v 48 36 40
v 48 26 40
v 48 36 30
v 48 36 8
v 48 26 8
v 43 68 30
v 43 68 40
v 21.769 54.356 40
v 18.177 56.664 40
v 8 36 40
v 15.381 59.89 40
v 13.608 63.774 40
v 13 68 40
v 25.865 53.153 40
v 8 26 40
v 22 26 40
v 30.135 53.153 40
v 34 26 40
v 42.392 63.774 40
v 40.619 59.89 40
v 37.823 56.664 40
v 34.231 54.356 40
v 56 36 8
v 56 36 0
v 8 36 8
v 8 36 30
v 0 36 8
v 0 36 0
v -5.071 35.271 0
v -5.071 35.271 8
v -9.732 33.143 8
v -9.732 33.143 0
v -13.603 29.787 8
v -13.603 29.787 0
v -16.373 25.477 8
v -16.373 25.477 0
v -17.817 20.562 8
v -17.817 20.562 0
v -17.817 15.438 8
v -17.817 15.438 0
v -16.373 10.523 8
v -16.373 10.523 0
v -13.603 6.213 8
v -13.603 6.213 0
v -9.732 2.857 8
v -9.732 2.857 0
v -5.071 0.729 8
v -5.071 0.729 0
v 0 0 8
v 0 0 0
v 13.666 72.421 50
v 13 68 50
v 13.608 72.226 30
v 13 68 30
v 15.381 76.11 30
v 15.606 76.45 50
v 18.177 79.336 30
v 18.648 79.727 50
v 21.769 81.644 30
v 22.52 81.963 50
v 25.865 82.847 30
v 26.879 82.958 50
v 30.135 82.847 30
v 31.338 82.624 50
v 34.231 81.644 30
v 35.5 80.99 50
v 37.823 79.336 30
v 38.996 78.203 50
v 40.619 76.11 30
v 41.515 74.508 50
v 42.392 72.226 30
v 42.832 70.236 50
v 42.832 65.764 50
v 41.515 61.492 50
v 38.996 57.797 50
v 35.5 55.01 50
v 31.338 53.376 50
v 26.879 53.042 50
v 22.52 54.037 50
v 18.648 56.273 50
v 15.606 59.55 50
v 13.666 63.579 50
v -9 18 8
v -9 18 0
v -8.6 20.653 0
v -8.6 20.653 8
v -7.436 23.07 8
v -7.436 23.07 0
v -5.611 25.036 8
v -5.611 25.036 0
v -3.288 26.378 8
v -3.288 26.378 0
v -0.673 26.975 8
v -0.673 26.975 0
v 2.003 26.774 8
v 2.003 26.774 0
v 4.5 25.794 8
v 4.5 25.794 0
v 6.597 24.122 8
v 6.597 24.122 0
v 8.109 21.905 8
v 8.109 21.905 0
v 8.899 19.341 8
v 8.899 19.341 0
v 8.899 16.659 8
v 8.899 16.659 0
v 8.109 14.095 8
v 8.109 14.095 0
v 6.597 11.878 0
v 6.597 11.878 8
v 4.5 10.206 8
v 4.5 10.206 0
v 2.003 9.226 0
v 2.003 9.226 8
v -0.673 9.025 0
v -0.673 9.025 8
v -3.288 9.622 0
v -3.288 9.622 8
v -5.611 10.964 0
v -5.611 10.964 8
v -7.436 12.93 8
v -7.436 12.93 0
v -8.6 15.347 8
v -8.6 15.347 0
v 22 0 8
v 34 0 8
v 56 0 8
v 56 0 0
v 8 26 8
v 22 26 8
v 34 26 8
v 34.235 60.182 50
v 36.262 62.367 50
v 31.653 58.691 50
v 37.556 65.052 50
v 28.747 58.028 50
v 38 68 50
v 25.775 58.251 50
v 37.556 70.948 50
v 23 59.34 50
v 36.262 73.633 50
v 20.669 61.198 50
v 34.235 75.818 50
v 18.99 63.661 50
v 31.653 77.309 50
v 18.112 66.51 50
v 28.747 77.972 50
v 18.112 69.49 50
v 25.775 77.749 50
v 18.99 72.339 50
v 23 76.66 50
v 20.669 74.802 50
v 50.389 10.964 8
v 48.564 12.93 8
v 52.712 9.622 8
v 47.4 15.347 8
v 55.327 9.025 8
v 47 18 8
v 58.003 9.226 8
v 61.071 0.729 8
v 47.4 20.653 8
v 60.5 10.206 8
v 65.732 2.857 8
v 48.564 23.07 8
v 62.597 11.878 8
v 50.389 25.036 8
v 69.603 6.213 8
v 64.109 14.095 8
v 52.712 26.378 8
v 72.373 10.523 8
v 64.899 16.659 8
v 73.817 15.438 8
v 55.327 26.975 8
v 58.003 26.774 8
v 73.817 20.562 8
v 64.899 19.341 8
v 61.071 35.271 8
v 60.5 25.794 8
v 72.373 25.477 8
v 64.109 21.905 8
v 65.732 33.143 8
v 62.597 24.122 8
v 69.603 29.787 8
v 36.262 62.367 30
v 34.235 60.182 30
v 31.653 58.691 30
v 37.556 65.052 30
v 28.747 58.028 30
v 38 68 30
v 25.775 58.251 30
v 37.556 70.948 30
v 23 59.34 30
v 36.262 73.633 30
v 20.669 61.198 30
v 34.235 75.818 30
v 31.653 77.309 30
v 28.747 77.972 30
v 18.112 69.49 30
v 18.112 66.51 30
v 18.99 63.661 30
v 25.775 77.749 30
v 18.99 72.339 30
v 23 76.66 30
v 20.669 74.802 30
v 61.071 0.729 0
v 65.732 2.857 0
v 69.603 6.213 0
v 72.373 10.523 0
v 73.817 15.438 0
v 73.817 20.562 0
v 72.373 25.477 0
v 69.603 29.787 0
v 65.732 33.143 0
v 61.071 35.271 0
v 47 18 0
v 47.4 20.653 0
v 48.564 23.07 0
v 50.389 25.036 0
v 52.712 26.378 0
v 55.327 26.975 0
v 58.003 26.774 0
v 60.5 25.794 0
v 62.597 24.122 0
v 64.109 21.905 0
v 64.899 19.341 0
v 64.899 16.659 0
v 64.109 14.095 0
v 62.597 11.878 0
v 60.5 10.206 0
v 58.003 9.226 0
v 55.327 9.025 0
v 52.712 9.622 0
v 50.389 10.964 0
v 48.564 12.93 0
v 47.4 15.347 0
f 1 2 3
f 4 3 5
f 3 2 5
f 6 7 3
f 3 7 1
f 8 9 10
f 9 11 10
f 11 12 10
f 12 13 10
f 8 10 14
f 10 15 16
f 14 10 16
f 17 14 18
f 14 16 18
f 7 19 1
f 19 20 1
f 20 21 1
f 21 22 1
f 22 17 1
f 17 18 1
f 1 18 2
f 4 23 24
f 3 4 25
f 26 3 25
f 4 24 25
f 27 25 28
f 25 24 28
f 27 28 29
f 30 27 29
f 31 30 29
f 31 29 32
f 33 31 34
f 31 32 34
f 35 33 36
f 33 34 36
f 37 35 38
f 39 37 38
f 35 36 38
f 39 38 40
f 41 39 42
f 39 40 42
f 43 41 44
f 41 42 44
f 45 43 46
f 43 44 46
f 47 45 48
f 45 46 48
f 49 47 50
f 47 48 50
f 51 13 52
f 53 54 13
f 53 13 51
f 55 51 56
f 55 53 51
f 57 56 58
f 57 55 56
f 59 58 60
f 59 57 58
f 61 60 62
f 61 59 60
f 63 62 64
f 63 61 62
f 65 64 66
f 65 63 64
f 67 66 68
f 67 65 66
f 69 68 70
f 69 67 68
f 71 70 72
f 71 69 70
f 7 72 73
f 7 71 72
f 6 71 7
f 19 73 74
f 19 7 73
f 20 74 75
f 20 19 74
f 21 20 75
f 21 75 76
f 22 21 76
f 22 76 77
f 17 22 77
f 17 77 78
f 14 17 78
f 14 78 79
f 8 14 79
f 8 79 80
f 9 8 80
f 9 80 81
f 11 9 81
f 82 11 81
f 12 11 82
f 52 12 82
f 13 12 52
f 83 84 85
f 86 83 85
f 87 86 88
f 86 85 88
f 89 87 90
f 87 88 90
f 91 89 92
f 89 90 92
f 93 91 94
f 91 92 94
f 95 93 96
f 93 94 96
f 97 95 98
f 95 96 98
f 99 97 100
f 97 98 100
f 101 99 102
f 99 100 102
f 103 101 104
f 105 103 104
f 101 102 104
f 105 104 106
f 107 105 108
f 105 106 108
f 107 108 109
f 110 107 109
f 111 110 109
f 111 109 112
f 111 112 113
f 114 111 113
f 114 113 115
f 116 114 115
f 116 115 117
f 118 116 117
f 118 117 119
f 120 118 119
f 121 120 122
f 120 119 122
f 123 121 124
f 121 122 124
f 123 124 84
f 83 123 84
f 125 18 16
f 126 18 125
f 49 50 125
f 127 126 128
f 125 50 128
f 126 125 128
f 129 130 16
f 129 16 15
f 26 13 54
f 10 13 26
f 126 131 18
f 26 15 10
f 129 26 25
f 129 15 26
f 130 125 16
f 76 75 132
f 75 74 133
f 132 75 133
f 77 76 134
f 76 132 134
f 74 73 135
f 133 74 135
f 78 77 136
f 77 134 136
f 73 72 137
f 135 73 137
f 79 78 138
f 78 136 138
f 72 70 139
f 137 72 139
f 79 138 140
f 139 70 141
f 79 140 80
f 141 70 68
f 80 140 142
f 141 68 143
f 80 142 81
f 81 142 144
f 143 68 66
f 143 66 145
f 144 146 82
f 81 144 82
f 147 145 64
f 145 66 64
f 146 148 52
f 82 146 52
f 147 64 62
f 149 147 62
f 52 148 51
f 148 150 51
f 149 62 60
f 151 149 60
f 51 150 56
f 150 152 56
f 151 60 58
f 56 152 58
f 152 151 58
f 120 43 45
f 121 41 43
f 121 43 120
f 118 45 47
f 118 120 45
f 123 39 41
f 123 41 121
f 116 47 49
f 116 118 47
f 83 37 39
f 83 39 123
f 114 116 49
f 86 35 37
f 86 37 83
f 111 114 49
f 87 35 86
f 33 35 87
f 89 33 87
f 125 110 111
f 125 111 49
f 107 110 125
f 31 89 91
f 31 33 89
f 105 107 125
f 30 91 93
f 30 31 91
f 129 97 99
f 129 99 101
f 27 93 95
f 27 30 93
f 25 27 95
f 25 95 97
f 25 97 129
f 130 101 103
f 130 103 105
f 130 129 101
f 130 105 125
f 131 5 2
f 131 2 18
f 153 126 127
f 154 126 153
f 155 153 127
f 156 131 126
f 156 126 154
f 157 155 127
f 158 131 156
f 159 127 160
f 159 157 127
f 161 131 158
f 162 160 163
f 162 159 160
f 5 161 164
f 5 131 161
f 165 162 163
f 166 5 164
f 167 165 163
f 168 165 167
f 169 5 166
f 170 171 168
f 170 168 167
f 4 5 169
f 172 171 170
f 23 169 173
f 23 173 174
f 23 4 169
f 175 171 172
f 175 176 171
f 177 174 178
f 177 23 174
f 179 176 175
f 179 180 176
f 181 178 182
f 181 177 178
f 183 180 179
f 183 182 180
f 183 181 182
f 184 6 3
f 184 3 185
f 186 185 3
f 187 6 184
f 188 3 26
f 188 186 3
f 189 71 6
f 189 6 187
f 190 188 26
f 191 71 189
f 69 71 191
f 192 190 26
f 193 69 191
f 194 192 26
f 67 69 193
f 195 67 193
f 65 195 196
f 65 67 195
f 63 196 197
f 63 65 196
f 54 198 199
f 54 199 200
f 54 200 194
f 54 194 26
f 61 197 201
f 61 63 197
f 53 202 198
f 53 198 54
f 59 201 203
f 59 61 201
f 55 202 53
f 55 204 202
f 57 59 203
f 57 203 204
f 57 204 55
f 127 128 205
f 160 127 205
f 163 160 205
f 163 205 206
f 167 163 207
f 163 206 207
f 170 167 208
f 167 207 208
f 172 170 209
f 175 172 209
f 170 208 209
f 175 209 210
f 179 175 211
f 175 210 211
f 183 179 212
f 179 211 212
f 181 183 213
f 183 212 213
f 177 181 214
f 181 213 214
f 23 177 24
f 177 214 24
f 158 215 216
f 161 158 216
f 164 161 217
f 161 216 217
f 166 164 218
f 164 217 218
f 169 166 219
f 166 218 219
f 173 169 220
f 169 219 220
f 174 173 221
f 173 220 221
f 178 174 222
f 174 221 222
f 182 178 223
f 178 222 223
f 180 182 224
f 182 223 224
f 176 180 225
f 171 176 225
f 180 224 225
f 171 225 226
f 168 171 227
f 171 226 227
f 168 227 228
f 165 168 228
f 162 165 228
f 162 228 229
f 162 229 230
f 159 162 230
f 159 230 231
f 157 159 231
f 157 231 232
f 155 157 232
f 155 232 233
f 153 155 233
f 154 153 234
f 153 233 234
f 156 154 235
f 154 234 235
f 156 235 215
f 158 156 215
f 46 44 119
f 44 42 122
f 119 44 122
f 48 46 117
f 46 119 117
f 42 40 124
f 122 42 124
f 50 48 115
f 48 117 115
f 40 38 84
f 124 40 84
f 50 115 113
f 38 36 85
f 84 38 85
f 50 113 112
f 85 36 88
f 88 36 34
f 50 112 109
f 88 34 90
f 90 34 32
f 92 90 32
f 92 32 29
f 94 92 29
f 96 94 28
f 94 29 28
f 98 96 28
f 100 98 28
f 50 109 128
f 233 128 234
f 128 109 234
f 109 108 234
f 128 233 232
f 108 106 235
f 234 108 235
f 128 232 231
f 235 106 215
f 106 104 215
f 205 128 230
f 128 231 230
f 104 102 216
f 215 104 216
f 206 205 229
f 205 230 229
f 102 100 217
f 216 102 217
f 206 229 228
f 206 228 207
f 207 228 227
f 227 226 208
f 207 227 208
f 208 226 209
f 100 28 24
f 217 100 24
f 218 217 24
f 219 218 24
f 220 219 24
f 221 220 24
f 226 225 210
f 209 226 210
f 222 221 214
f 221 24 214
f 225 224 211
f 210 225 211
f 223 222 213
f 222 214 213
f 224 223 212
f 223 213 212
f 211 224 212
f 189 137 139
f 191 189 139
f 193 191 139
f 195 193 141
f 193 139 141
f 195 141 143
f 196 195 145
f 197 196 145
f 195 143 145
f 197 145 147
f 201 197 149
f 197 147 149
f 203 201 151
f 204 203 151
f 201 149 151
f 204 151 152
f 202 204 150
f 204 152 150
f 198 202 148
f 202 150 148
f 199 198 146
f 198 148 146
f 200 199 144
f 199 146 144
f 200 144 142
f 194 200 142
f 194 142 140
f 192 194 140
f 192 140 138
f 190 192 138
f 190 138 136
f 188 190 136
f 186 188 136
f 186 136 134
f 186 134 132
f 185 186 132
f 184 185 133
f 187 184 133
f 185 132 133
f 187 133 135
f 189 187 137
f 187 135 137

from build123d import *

# Parameters (mm, degrees)
BOSS_EXTRUDE2_DEPTH = 8
SKETCH5_R           = 9
CUT_EXTRUDE2_DEPTH  = 8
BOSS_EXTRUDE3_DEPTH = 32
CUT_EXTRUDE3_DEPTH  = 12
SKETCH8_W           = 40
SKETCH8_H           = 10
BOSS_EXTRUDE4_DEPTH = 32
SKETCH10_R          = 15
BOSS_EXTRUDE5_DEPTH = 20
CUT_EXTRUDE4_DEPTH  = 10
CUT_EXTRUDE5_DEPTH  = 10
SKETCH14_R          = 10
CUT_EXTRUDE6_DEPTH  = 20


with BuildPart() as part:
    # Sketch1 → Boss-Extrude2 (new body)
    with BuildSketch(Plane.XY):
        with BuildLine():
            Line((0, 0), (56, 0))
            ThreePointArc((56, 0), (74, 18), (56, 36))
            Line((56, 36), (0, 36))
            ThreePointArc((0, 36), (-18, 18), (0, 0))
        make_face()
    extrude(amount=BOSS_EXTRUDE2_DEPTH)

    # Sketch5 → Cut-Extrude2 (cut)
    with BuildSketch(Plane(origin=(0, 0, 0), x_dir=(-1, 0, 0), z_dir=(0, 0, -1))):
        with Locations((0, 18)):
            Circle(SKETCH5_R)
        with Locations((-56, 18)):
            Circle(SKETCH5_R)
    extrude(amount=-CUT_EXTRUDE2_DEPTH, mode=Mode.SUBTRACT)

    # Sketch6 → Boss-Extrude3 (add)
    with BuildSketch(Plane.XY.offset(8)):
        Polygon((8, 36), (48, 36), (48, 26), (34, 26), (34, 0), (22, 0), (22, 26), (8, 26), align=None)
    extrude(amount=BOSS_EXTRUDE3_DEPTH)

    # Sketch7 → Cut-Extrude3 (cut)
    with BuildSketch(Plane(origin=(34, 0, 0), x_dir=(0, 0, -1), z_dir=(1, 0, 0))):
        Polygon((-40, 26), (-8, 0), (-40, 0), align=None)
    extrude(amount=-CUT_EXTRUDE3_DEPTH, mode=Mode.SUBTRACT)

    # Sketch8 → Boss-Extrude4 (add)
    with BuildSketch(Plane(origin=(0, 36, 0), x_dir=(1, 0, 0), z_dir=(0, 1, 0))):
        with Locations((28, -35)):
            Rectangle(SKETCH8_W, SKETCH8_H)
    extrude(amount=BOSS_EXTRUDE4_DEPTH)

    # Sketch10 → Boss-Extrude5 (add)
    with BuildSketch(Plane(origin=(0, 0, 30), x_dir=(-1, 0, 0), z_dir=(0, 0, -1))):
        with Locations((-28, 68)):
            Circle(SKETCH10_R)
    extrude(amount=-BOSS_EXTRUDE5_DEPTH)

    # Sketch11 → Cut-Extrude4 (cut)
    with BuildSketch(Plane.XY.offset(40)):
        Polygon((43, 68), (48, 36), (48, 68), align=None)
    extrude(amount=-CUT_EXTRUDE4_DEPTH, mode=Mode.SUBTRACT)

    # Sketch13 → Cut-Extrude5 (cut)
    with BuildSketch(Plane.XY.offset(40)):
        Polygon((13, 68), (8, 36), (8, 68), align=None)
    extrude(amount=-CUT_EXTRUDE5_DEPTH, mode=Mode.SUBTRACT)

    # Sketch14 → Cut-Extrude6 (cut)
    with BuildSketch(Plane.XY.offset(50)):
        with Locations((28, 68)):
            Circle(SKETCH14_R)
    extrude(amount=-CUT_EXTRUDE6_DEPTH, mode=Mode.SUBTRACT)


solid = part.part
